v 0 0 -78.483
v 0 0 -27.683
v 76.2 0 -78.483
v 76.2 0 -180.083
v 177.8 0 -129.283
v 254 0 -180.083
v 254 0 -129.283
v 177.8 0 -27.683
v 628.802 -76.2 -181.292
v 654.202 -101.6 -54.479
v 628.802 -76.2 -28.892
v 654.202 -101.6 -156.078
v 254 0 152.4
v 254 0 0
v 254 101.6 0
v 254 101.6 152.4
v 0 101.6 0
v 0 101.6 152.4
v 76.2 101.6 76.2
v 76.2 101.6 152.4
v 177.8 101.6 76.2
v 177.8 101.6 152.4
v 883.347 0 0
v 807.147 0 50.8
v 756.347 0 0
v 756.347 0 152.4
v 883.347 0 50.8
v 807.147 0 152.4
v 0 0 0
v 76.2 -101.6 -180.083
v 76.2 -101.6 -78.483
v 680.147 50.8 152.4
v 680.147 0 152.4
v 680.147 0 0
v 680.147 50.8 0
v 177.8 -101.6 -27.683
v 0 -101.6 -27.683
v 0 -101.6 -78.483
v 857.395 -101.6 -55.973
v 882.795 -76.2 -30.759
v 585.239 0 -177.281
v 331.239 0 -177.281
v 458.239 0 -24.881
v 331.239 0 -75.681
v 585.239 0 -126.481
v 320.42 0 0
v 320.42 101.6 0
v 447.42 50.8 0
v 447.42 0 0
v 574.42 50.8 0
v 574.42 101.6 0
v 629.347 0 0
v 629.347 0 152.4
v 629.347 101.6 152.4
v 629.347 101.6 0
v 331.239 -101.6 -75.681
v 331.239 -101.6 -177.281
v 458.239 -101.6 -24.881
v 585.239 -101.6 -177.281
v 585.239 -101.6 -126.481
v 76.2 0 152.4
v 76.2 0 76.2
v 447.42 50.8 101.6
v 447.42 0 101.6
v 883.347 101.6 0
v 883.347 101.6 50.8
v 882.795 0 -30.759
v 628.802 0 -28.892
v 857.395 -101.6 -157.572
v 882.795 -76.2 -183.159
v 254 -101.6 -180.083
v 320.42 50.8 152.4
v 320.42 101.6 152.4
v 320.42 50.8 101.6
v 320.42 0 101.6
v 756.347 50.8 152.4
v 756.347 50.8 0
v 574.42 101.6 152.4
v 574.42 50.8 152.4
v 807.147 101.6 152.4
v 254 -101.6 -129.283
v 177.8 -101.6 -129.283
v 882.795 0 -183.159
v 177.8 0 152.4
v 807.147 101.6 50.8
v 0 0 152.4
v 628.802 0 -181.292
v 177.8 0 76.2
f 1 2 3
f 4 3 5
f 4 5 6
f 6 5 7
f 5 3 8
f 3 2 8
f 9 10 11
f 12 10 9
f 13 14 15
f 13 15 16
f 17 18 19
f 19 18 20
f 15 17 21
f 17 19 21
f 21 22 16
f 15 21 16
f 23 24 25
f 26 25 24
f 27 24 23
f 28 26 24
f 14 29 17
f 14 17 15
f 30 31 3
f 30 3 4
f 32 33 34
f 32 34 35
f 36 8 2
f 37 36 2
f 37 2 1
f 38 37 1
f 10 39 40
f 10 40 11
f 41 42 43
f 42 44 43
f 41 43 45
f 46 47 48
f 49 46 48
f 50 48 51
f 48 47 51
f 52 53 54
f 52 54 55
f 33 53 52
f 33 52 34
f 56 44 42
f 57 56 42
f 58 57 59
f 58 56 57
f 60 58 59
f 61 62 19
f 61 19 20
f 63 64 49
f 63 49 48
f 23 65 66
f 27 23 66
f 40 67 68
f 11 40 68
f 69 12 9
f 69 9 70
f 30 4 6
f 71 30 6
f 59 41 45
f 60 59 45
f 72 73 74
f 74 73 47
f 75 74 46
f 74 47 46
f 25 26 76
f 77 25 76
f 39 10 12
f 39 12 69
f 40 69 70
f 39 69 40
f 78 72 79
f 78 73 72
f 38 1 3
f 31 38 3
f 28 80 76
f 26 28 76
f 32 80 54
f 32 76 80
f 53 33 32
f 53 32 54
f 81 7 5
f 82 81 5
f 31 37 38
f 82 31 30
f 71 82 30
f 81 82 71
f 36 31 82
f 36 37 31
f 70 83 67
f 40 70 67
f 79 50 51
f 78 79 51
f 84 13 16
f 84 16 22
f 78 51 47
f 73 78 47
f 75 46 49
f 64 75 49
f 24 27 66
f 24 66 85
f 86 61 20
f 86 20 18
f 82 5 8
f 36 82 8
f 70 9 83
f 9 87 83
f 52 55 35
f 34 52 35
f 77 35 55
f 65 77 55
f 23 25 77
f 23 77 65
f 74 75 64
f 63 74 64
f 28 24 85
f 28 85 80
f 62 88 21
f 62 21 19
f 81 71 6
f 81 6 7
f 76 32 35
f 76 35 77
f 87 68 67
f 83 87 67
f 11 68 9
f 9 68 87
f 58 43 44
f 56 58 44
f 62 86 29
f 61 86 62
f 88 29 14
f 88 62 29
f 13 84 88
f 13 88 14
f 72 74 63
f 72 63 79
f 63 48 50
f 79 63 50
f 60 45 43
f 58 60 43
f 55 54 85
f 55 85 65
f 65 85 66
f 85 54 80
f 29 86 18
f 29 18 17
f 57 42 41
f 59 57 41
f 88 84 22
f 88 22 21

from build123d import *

# Parameters (mm, degrees)
F1_DEPTH  = 101.6
F3_DEPTH  = 152.4
F4_W      = 127
F4_H      = 50.8
F5_DEPTH  = 50.8
F7_DEPTH  = 101.6
F8_W      = 76.2
F8_H      = 50.8
F9_DEPTH  = 152.4
F11_DEPTH = 101.6
F13_DEPTH = 101.6
F15_DEPTH = 101.6
F16_SIZE  = 25.4
F17_SIZE  = 25.4


with BuildPart() as f1:
    # F0 (on Front) → F1 (new body)
    with BuildSketch(Plane.XZ):
        Polygon((0, 152.4), (0, 0), (254, 0), (254, 152.4), (177.8, 152.4), (177.8, 76.2), (76.2, 76.2), (76.2, 152.4), align=None)
    extrude(amount=-F1_DEPTH)


with BuildPart() as f3:
    # F2 (on Top) → F3 (new body)
    with BuildSketch(Plane.XY):
        Polygon((574.41955, 50.8), (574.41955, 101.6), (320.41955, 101.6), (320.41955, 0), (447.41955, 0), (447.41955, 50.8), align=None)
    extrude(amount=F3_DEPTH)

    # F4 (on face) → F5 (cut)
    with BuildSketch(Plane.XZ):
        with Locations((383.91955, 127)):
            Rectangle(F4_W, F4_H)
    extrude(amount=-F5_DEPTH, mode=Mode.SUBTRACT)


with BuildPart() as f7:
    # F6 (on Front) → F7 (new body)
    with BuildSketch(Plane.XZ):
        Polygon((629.346893, 152.4), (629.346893, 0), (883.346893, 0), (883.346893, 50.8), (807.146893, 50.8), (807.146893, 152.4), align=None)
    extrude(amount=-F7_DEPTH)

    # F8 (on face) → F9 (cut)
    with BuildSketch(Plane.XY.offset(152.4)):
        with Locations((718.246893, 25.4)):
            Rectangle(F8_W, F8_H)
    extrude(amount=-F9_DEPTH, mode=Mode.SUBTRACT)


with BuildPart() as f11:
    # F10 (on Front) → F11 (new body)
    with BuildSketch(Plane.XZ):
        Polygon((177.8, -27.683238), (0, -27.683238), (0, -78.483238), (76.2, -78.483238), (76.2, -180.083238), (254, -180.083238), (254, -129.283238), (177.8, -129.283238), align=None)
    extrude(amount=F11_DEPTH)


with BuildPart() as f13:
    # F12 (on Front) → F13 (new body)
    with BuildSketch(Plane.XZ):
        Polygon((331.239105, -177.280673), (585.239105, -177.280673), (585.239105, -126.480673), (458.239105, -24.880673), (331.239105, -75.680673), align=None)
    extrude(amount=F13_DEPTH)


with BuildPart() as f15:
    # F14 (on Front) → F15 (new body)
    with BuildSketch(Plane.XZ):
        Polygon((628.801897, -28.891818), (628.801897, -181.291818), (882.795031, -183.159415), (882.795031, -30.759415), align=None)
    extrude(amount=F15_DEPTH)

    # F16
    f16_edges = [f15.edges().sort_by_distance(p)[0] for p in [
        (755.798464, -101.6, -29.825617),
        (882.795031, -101.6, -106.959415),
        (628.801897, -101.6, -105.091818),
    ]]
    chamfer(f16_edges, length=F16_SIZE)

    # F17
    f17_edges = [f15.edges().sort_by_distance(p)[0] for p in [
        (755.798464, -101.6, -182.225617),
    ]]
    chamfer(f17_edges, length=F17_SIZE)


solid = Compound([f1.part, f3.part, f7.part, f11.part, f13.part, f15.part])
